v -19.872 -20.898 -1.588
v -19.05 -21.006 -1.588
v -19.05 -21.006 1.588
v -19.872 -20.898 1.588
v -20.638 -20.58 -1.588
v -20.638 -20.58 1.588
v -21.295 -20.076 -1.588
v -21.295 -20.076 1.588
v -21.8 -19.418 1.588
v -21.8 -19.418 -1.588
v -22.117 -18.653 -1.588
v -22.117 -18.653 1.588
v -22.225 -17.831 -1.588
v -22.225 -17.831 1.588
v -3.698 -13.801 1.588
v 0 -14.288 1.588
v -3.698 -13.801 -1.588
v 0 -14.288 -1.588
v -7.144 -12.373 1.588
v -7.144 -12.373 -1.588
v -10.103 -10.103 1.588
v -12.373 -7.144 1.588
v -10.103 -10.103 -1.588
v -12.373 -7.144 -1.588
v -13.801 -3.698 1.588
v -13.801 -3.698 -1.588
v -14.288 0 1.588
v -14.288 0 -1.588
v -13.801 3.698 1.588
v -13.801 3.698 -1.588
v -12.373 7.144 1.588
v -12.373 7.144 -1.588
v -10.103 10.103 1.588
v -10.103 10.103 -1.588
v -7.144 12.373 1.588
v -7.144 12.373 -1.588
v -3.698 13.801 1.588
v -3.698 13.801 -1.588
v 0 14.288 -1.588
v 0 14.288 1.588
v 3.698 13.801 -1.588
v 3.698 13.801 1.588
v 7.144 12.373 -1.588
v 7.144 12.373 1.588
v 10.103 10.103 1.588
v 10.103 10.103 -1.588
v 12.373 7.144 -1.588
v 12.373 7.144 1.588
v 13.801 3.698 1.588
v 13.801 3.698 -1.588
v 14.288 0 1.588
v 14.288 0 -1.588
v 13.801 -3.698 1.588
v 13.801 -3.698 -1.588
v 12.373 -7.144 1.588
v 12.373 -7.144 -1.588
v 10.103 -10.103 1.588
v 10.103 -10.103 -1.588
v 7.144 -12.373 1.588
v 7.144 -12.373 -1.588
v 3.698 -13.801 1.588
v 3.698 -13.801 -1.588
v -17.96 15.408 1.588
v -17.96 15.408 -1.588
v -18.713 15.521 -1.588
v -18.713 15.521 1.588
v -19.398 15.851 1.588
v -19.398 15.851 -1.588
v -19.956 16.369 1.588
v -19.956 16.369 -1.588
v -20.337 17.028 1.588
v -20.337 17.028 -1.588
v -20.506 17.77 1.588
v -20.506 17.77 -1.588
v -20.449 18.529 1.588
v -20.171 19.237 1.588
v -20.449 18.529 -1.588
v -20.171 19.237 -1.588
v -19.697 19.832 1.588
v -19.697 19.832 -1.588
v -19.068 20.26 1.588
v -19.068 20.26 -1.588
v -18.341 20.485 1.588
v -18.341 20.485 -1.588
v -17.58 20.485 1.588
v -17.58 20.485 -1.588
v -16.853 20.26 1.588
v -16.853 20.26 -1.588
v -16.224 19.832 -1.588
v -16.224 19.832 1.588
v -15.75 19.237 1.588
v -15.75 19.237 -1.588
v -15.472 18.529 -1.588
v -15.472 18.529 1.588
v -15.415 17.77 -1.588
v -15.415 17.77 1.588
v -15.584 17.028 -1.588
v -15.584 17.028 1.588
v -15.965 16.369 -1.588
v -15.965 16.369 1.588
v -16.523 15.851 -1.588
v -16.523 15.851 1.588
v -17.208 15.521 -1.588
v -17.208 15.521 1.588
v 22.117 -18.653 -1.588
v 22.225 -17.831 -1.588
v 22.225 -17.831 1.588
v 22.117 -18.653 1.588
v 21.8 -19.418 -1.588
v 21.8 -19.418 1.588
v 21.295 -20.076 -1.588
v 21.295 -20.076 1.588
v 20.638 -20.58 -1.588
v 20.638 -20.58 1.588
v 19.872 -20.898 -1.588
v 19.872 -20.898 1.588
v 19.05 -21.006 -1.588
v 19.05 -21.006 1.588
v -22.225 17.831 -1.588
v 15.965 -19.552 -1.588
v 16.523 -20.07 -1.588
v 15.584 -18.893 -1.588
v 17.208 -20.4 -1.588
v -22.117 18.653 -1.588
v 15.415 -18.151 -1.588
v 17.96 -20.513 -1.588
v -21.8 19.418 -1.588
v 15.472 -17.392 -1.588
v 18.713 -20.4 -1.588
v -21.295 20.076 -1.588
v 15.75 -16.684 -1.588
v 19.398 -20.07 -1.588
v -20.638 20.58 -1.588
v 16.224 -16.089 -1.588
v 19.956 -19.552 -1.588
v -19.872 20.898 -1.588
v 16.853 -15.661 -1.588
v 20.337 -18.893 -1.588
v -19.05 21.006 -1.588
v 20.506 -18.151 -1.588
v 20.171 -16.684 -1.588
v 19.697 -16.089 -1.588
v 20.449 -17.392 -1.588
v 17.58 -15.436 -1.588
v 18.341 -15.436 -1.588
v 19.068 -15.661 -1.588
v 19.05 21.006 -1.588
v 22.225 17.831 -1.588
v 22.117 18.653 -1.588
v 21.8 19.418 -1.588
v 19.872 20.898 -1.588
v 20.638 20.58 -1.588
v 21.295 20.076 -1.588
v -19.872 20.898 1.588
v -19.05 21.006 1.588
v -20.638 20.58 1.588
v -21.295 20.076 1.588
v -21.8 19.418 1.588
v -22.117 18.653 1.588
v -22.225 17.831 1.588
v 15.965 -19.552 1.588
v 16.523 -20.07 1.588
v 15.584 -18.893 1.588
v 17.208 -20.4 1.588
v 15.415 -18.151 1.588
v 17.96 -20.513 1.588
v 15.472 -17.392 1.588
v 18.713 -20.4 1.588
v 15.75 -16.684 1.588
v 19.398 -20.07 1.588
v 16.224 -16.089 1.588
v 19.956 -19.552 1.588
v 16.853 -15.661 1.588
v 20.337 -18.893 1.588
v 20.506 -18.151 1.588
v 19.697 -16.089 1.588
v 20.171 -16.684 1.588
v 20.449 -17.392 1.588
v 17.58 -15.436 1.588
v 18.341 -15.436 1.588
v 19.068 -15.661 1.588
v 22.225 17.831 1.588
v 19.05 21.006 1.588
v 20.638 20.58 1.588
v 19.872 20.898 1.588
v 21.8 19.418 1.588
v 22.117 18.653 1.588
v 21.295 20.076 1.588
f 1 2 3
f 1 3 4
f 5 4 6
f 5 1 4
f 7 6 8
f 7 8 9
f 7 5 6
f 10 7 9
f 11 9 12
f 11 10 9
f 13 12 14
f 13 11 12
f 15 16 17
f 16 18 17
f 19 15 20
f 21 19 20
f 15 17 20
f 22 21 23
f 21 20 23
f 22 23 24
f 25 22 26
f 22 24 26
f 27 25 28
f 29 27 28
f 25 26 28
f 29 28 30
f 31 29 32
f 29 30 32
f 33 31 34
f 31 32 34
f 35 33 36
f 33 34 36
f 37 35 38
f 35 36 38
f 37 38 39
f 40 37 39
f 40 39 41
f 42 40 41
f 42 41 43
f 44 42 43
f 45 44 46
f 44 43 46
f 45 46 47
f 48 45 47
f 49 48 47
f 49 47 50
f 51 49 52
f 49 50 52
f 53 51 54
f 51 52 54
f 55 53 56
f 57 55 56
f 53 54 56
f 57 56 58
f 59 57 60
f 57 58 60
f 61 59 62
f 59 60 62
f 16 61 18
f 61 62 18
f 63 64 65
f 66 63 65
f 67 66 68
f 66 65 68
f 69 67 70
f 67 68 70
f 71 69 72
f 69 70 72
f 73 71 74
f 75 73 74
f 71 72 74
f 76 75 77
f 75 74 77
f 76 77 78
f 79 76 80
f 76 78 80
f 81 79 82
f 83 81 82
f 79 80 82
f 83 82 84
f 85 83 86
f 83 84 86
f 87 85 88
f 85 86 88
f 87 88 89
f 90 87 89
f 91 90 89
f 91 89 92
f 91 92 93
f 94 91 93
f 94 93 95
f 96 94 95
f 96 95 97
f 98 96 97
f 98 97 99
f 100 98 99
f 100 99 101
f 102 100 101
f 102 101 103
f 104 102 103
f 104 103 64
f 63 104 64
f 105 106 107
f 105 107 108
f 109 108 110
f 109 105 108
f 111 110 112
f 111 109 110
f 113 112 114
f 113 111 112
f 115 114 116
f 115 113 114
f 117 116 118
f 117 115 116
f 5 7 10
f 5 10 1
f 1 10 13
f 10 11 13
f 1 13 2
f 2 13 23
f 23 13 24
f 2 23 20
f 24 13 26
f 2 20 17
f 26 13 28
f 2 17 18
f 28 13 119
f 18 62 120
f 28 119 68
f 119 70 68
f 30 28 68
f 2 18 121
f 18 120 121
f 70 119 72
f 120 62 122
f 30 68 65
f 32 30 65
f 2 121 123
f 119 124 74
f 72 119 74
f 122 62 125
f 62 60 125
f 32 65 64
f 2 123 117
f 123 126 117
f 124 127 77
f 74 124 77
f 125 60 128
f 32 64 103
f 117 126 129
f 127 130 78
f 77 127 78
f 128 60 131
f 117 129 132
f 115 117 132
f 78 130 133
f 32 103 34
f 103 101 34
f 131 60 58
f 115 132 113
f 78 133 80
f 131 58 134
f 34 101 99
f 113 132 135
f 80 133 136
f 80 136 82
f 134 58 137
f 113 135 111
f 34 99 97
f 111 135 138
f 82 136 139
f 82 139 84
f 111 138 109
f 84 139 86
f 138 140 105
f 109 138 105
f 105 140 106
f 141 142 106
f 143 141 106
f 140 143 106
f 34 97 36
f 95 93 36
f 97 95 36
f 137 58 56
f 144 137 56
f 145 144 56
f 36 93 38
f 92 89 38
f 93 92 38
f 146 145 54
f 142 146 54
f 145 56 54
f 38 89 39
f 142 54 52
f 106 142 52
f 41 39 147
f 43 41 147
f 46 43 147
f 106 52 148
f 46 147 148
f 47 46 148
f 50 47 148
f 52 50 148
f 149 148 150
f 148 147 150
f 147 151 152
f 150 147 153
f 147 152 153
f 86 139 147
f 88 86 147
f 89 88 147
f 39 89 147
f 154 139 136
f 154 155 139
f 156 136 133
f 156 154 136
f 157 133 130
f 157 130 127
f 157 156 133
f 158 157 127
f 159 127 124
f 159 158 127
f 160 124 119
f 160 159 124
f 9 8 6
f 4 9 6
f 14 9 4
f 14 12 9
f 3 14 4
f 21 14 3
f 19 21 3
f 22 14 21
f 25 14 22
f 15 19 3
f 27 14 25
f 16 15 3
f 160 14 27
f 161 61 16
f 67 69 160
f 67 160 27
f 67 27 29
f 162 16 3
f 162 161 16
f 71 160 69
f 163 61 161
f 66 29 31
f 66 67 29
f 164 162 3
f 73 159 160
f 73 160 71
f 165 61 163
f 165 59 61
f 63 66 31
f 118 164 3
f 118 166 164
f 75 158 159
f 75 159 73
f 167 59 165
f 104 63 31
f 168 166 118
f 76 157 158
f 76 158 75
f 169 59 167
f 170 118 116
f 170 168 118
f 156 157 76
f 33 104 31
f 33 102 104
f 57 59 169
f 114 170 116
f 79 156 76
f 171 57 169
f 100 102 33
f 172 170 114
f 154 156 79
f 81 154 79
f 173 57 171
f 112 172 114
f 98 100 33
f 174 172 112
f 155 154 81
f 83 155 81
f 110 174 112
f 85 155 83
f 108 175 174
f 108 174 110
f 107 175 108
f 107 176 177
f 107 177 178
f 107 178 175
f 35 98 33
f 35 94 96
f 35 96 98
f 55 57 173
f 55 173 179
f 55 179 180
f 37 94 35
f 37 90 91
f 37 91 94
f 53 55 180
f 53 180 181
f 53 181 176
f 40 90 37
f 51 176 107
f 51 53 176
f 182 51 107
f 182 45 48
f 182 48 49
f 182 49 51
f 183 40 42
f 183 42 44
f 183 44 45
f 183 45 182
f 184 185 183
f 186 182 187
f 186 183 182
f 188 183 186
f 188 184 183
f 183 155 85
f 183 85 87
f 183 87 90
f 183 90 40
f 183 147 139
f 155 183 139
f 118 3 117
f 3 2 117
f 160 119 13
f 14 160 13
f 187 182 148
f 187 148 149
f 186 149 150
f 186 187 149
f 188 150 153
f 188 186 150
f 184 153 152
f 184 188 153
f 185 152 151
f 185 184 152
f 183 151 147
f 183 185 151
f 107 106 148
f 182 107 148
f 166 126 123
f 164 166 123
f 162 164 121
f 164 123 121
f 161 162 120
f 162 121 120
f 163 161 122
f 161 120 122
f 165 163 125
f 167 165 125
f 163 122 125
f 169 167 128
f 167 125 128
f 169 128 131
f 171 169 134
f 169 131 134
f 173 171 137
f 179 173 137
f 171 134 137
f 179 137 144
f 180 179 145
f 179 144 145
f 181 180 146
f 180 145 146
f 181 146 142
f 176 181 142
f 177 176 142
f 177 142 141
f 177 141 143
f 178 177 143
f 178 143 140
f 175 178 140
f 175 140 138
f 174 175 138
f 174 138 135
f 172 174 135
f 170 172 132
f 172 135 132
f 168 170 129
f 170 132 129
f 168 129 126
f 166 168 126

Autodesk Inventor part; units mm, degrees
ref_plane "YZ Plane" through (0, 0, 0) normal (1, 0, 0) x (0, 1, 0)
ref_plane "XZ Plane" through (0, 0, 0) normal (0, 1, 0) x (-1, 0, 0)
ref_plane "XY Plane" through (0, 0, 0) normal (0, 0, 1) x (1, 0, 0)
sketch "Sketch2" plane through (0, 0, 0) normal (0, 0, 1) x (1, 0, 0)
  line L0 (22.225, 21.0058) -> (-22.225, 21.0058)
  line L1 (-22.225, 21.0058) -> (-22.225, -21.0058)
  line L2 (-22.225, -21.0058) -> (22.225, -21.0058)
  line L3 (22.225, -21.0058) -> (22.225, 21.0058)
  line L4 (22.225, 21.0058) -> (-22.225, -21.0058) construction
  line L5 (-22.225, 21.0058) -> (22.225, -21.0058) construction
  point P0 (0, 0)
  dimension "d0" = 44.45
  dimension "d1" = 42.0116
extrude "Extrusion1" add sketch "Sketch2" along normal mid plane 3.175
sketch "Sketch3" plane through (0, 0, 1.5875) normal (0, 0, 1) x (1, 0, 0)
  point P0 (0, 0)
  point P1 (0, 0)
hole "Hole1" at (0, 0, 1.5875) direction (0, 0, -1) diameter 28.575 end through all
sketch "Sketch4" plane through (0, 0, 1.5875) normal (0, 0, 1) x (1, 0, 0)
  line L0 (17.9605, -17.9605) -> (-17.9605, 17.9605) construction
  line L1 (-31.115, 0) -> (31.115, 0) construction
  line L2 (0, 29.4081) -> (0, -29.4081) construction
  point P0 (0, 0)
  point P1 (0, 0)
  dimension "d11" = 45
  dimension "d12" = 50.8
hole "Hole2" at (17.9605, -17.9605, 1.5875) at (-17.9605, 17.9605, 1.5875) direction (0, 0, -1) diameter 5.1054 end through all clearance for "Flat Head Machine Screw (82)" size "#10" standard "Ansi Unified Screw Threads"
fillet "Fillet1" radius 3.175 4 edges at (22.225, -21.0058, 0) (-22.225, 21.0058, 0) (22.225, 21.0058, 0) (-22.225, -21.0058, 0)
properties part number "SPACER,NEO550,ARM" material "Nylon 6/6"
